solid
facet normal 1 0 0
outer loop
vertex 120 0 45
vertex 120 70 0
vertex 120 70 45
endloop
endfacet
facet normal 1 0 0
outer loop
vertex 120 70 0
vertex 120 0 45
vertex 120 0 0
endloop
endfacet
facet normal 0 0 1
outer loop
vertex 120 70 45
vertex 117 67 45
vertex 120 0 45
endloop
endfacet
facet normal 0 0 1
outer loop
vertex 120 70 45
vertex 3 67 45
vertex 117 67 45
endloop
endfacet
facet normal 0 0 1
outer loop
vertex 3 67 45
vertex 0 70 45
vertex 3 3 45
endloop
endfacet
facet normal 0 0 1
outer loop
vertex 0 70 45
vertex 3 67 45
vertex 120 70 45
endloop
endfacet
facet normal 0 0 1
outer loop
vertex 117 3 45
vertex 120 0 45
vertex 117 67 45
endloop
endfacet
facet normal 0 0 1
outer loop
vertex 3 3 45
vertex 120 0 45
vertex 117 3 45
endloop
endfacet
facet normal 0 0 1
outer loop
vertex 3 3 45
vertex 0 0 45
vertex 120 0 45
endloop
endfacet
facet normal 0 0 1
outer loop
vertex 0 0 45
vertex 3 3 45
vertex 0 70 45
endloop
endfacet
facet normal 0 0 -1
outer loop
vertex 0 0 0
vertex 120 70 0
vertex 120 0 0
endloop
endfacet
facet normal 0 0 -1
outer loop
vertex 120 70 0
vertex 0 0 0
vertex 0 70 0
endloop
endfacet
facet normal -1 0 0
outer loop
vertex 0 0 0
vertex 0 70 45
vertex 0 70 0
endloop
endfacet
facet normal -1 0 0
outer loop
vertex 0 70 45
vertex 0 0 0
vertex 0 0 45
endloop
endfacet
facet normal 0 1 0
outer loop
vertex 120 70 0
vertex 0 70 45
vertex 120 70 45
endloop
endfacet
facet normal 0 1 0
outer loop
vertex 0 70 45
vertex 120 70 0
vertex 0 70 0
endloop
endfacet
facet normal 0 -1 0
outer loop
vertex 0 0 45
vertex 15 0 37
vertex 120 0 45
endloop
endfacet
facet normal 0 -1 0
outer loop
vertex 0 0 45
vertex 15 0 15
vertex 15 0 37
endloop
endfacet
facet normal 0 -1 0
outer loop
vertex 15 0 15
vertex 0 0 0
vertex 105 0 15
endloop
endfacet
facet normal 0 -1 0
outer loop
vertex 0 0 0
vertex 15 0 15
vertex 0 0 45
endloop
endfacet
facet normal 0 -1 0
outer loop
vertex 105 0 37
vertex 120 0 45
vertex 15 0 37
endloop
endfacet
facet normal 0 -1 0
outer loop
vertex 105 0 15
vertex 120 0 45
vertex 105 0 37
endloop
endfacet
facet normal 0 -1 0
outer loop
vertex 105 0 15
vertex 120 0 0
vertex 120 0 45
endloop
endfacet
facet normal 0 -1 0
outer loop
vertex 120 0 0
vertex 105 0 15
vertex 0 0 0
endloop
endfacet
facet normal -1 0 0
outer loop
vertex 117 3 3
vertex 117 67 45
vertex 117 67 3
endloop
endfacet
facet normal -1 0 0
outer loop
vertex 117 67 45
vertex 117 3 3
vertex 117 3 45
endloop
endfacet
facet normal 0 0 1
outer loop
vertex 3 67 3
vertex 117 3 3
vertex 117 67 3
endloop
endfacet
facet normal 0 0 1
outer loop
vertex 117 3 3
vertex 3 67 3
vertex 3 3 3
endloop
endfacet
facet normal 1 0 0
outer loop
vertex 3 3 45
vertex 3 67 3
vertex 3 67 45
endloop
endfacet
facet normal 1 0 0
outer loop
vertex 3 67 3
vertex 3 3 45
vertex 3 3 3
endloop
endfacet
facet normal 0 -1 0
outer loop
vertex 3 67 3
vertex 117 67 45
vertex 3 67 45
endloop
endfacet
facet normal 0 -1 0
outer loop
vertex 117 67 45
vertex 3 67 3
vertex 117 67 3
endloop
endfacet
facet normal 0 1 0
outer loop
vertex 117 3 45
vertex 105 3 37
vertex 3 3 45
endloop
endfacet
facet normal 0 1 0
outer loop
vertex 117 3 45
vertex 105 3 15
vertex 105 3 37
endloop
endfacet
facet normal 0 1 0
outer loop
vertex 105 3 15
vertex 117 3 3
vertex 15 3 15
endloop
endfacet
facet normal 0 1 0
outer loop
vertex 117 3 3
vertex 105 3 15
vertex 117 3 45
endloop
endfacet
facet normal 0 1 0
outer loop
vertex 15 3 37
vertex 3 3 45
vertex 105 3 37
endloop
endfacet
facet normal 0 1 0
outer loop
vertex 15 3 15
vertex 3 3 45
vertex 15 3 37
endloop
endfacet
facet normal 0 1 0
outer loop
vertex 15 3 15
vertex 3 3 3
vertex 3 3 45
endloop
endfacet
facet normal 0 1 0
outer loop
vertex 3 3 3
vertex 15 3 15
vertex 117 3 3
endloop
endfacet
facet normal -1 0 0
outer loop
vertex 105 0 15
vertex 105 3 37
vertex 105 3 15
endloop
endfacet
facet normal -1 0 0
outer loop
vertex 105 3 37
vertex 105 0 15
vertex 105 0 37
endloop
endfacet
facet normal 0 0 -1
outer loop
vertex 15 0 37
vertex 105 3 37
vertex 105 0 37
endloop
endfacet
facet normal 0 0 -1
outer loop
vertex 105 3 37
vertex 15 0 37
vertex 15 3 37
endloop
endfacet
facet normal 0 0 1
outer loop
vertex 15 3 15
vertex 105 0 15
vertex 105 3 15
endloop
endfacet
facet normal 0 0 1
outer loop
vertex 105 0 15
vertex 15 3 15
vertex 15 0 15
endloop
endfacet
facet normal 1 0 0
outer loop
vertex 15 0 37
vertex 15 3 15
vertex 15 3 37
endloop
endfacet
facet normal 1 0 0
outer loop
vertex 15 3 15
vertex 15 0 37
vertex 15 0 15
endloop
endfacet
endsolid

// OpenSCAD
// Rentevekkeren - hus til skrivebordsklokke. Mål i mm.
bredde = 120;
dybde = 70;
hoyde = 45;
vegg = 3;

difference() {
    cube([bredde, dybde, hoyde]);
    translate([vegg, vegg, vegg]) cube([bredde - 2 * vegg, dybde - 2 * vegg, hoyde]);
    translate([15, -1, 15]) cube([90, vegg + 2, 22]);  // skjermvindu
}
